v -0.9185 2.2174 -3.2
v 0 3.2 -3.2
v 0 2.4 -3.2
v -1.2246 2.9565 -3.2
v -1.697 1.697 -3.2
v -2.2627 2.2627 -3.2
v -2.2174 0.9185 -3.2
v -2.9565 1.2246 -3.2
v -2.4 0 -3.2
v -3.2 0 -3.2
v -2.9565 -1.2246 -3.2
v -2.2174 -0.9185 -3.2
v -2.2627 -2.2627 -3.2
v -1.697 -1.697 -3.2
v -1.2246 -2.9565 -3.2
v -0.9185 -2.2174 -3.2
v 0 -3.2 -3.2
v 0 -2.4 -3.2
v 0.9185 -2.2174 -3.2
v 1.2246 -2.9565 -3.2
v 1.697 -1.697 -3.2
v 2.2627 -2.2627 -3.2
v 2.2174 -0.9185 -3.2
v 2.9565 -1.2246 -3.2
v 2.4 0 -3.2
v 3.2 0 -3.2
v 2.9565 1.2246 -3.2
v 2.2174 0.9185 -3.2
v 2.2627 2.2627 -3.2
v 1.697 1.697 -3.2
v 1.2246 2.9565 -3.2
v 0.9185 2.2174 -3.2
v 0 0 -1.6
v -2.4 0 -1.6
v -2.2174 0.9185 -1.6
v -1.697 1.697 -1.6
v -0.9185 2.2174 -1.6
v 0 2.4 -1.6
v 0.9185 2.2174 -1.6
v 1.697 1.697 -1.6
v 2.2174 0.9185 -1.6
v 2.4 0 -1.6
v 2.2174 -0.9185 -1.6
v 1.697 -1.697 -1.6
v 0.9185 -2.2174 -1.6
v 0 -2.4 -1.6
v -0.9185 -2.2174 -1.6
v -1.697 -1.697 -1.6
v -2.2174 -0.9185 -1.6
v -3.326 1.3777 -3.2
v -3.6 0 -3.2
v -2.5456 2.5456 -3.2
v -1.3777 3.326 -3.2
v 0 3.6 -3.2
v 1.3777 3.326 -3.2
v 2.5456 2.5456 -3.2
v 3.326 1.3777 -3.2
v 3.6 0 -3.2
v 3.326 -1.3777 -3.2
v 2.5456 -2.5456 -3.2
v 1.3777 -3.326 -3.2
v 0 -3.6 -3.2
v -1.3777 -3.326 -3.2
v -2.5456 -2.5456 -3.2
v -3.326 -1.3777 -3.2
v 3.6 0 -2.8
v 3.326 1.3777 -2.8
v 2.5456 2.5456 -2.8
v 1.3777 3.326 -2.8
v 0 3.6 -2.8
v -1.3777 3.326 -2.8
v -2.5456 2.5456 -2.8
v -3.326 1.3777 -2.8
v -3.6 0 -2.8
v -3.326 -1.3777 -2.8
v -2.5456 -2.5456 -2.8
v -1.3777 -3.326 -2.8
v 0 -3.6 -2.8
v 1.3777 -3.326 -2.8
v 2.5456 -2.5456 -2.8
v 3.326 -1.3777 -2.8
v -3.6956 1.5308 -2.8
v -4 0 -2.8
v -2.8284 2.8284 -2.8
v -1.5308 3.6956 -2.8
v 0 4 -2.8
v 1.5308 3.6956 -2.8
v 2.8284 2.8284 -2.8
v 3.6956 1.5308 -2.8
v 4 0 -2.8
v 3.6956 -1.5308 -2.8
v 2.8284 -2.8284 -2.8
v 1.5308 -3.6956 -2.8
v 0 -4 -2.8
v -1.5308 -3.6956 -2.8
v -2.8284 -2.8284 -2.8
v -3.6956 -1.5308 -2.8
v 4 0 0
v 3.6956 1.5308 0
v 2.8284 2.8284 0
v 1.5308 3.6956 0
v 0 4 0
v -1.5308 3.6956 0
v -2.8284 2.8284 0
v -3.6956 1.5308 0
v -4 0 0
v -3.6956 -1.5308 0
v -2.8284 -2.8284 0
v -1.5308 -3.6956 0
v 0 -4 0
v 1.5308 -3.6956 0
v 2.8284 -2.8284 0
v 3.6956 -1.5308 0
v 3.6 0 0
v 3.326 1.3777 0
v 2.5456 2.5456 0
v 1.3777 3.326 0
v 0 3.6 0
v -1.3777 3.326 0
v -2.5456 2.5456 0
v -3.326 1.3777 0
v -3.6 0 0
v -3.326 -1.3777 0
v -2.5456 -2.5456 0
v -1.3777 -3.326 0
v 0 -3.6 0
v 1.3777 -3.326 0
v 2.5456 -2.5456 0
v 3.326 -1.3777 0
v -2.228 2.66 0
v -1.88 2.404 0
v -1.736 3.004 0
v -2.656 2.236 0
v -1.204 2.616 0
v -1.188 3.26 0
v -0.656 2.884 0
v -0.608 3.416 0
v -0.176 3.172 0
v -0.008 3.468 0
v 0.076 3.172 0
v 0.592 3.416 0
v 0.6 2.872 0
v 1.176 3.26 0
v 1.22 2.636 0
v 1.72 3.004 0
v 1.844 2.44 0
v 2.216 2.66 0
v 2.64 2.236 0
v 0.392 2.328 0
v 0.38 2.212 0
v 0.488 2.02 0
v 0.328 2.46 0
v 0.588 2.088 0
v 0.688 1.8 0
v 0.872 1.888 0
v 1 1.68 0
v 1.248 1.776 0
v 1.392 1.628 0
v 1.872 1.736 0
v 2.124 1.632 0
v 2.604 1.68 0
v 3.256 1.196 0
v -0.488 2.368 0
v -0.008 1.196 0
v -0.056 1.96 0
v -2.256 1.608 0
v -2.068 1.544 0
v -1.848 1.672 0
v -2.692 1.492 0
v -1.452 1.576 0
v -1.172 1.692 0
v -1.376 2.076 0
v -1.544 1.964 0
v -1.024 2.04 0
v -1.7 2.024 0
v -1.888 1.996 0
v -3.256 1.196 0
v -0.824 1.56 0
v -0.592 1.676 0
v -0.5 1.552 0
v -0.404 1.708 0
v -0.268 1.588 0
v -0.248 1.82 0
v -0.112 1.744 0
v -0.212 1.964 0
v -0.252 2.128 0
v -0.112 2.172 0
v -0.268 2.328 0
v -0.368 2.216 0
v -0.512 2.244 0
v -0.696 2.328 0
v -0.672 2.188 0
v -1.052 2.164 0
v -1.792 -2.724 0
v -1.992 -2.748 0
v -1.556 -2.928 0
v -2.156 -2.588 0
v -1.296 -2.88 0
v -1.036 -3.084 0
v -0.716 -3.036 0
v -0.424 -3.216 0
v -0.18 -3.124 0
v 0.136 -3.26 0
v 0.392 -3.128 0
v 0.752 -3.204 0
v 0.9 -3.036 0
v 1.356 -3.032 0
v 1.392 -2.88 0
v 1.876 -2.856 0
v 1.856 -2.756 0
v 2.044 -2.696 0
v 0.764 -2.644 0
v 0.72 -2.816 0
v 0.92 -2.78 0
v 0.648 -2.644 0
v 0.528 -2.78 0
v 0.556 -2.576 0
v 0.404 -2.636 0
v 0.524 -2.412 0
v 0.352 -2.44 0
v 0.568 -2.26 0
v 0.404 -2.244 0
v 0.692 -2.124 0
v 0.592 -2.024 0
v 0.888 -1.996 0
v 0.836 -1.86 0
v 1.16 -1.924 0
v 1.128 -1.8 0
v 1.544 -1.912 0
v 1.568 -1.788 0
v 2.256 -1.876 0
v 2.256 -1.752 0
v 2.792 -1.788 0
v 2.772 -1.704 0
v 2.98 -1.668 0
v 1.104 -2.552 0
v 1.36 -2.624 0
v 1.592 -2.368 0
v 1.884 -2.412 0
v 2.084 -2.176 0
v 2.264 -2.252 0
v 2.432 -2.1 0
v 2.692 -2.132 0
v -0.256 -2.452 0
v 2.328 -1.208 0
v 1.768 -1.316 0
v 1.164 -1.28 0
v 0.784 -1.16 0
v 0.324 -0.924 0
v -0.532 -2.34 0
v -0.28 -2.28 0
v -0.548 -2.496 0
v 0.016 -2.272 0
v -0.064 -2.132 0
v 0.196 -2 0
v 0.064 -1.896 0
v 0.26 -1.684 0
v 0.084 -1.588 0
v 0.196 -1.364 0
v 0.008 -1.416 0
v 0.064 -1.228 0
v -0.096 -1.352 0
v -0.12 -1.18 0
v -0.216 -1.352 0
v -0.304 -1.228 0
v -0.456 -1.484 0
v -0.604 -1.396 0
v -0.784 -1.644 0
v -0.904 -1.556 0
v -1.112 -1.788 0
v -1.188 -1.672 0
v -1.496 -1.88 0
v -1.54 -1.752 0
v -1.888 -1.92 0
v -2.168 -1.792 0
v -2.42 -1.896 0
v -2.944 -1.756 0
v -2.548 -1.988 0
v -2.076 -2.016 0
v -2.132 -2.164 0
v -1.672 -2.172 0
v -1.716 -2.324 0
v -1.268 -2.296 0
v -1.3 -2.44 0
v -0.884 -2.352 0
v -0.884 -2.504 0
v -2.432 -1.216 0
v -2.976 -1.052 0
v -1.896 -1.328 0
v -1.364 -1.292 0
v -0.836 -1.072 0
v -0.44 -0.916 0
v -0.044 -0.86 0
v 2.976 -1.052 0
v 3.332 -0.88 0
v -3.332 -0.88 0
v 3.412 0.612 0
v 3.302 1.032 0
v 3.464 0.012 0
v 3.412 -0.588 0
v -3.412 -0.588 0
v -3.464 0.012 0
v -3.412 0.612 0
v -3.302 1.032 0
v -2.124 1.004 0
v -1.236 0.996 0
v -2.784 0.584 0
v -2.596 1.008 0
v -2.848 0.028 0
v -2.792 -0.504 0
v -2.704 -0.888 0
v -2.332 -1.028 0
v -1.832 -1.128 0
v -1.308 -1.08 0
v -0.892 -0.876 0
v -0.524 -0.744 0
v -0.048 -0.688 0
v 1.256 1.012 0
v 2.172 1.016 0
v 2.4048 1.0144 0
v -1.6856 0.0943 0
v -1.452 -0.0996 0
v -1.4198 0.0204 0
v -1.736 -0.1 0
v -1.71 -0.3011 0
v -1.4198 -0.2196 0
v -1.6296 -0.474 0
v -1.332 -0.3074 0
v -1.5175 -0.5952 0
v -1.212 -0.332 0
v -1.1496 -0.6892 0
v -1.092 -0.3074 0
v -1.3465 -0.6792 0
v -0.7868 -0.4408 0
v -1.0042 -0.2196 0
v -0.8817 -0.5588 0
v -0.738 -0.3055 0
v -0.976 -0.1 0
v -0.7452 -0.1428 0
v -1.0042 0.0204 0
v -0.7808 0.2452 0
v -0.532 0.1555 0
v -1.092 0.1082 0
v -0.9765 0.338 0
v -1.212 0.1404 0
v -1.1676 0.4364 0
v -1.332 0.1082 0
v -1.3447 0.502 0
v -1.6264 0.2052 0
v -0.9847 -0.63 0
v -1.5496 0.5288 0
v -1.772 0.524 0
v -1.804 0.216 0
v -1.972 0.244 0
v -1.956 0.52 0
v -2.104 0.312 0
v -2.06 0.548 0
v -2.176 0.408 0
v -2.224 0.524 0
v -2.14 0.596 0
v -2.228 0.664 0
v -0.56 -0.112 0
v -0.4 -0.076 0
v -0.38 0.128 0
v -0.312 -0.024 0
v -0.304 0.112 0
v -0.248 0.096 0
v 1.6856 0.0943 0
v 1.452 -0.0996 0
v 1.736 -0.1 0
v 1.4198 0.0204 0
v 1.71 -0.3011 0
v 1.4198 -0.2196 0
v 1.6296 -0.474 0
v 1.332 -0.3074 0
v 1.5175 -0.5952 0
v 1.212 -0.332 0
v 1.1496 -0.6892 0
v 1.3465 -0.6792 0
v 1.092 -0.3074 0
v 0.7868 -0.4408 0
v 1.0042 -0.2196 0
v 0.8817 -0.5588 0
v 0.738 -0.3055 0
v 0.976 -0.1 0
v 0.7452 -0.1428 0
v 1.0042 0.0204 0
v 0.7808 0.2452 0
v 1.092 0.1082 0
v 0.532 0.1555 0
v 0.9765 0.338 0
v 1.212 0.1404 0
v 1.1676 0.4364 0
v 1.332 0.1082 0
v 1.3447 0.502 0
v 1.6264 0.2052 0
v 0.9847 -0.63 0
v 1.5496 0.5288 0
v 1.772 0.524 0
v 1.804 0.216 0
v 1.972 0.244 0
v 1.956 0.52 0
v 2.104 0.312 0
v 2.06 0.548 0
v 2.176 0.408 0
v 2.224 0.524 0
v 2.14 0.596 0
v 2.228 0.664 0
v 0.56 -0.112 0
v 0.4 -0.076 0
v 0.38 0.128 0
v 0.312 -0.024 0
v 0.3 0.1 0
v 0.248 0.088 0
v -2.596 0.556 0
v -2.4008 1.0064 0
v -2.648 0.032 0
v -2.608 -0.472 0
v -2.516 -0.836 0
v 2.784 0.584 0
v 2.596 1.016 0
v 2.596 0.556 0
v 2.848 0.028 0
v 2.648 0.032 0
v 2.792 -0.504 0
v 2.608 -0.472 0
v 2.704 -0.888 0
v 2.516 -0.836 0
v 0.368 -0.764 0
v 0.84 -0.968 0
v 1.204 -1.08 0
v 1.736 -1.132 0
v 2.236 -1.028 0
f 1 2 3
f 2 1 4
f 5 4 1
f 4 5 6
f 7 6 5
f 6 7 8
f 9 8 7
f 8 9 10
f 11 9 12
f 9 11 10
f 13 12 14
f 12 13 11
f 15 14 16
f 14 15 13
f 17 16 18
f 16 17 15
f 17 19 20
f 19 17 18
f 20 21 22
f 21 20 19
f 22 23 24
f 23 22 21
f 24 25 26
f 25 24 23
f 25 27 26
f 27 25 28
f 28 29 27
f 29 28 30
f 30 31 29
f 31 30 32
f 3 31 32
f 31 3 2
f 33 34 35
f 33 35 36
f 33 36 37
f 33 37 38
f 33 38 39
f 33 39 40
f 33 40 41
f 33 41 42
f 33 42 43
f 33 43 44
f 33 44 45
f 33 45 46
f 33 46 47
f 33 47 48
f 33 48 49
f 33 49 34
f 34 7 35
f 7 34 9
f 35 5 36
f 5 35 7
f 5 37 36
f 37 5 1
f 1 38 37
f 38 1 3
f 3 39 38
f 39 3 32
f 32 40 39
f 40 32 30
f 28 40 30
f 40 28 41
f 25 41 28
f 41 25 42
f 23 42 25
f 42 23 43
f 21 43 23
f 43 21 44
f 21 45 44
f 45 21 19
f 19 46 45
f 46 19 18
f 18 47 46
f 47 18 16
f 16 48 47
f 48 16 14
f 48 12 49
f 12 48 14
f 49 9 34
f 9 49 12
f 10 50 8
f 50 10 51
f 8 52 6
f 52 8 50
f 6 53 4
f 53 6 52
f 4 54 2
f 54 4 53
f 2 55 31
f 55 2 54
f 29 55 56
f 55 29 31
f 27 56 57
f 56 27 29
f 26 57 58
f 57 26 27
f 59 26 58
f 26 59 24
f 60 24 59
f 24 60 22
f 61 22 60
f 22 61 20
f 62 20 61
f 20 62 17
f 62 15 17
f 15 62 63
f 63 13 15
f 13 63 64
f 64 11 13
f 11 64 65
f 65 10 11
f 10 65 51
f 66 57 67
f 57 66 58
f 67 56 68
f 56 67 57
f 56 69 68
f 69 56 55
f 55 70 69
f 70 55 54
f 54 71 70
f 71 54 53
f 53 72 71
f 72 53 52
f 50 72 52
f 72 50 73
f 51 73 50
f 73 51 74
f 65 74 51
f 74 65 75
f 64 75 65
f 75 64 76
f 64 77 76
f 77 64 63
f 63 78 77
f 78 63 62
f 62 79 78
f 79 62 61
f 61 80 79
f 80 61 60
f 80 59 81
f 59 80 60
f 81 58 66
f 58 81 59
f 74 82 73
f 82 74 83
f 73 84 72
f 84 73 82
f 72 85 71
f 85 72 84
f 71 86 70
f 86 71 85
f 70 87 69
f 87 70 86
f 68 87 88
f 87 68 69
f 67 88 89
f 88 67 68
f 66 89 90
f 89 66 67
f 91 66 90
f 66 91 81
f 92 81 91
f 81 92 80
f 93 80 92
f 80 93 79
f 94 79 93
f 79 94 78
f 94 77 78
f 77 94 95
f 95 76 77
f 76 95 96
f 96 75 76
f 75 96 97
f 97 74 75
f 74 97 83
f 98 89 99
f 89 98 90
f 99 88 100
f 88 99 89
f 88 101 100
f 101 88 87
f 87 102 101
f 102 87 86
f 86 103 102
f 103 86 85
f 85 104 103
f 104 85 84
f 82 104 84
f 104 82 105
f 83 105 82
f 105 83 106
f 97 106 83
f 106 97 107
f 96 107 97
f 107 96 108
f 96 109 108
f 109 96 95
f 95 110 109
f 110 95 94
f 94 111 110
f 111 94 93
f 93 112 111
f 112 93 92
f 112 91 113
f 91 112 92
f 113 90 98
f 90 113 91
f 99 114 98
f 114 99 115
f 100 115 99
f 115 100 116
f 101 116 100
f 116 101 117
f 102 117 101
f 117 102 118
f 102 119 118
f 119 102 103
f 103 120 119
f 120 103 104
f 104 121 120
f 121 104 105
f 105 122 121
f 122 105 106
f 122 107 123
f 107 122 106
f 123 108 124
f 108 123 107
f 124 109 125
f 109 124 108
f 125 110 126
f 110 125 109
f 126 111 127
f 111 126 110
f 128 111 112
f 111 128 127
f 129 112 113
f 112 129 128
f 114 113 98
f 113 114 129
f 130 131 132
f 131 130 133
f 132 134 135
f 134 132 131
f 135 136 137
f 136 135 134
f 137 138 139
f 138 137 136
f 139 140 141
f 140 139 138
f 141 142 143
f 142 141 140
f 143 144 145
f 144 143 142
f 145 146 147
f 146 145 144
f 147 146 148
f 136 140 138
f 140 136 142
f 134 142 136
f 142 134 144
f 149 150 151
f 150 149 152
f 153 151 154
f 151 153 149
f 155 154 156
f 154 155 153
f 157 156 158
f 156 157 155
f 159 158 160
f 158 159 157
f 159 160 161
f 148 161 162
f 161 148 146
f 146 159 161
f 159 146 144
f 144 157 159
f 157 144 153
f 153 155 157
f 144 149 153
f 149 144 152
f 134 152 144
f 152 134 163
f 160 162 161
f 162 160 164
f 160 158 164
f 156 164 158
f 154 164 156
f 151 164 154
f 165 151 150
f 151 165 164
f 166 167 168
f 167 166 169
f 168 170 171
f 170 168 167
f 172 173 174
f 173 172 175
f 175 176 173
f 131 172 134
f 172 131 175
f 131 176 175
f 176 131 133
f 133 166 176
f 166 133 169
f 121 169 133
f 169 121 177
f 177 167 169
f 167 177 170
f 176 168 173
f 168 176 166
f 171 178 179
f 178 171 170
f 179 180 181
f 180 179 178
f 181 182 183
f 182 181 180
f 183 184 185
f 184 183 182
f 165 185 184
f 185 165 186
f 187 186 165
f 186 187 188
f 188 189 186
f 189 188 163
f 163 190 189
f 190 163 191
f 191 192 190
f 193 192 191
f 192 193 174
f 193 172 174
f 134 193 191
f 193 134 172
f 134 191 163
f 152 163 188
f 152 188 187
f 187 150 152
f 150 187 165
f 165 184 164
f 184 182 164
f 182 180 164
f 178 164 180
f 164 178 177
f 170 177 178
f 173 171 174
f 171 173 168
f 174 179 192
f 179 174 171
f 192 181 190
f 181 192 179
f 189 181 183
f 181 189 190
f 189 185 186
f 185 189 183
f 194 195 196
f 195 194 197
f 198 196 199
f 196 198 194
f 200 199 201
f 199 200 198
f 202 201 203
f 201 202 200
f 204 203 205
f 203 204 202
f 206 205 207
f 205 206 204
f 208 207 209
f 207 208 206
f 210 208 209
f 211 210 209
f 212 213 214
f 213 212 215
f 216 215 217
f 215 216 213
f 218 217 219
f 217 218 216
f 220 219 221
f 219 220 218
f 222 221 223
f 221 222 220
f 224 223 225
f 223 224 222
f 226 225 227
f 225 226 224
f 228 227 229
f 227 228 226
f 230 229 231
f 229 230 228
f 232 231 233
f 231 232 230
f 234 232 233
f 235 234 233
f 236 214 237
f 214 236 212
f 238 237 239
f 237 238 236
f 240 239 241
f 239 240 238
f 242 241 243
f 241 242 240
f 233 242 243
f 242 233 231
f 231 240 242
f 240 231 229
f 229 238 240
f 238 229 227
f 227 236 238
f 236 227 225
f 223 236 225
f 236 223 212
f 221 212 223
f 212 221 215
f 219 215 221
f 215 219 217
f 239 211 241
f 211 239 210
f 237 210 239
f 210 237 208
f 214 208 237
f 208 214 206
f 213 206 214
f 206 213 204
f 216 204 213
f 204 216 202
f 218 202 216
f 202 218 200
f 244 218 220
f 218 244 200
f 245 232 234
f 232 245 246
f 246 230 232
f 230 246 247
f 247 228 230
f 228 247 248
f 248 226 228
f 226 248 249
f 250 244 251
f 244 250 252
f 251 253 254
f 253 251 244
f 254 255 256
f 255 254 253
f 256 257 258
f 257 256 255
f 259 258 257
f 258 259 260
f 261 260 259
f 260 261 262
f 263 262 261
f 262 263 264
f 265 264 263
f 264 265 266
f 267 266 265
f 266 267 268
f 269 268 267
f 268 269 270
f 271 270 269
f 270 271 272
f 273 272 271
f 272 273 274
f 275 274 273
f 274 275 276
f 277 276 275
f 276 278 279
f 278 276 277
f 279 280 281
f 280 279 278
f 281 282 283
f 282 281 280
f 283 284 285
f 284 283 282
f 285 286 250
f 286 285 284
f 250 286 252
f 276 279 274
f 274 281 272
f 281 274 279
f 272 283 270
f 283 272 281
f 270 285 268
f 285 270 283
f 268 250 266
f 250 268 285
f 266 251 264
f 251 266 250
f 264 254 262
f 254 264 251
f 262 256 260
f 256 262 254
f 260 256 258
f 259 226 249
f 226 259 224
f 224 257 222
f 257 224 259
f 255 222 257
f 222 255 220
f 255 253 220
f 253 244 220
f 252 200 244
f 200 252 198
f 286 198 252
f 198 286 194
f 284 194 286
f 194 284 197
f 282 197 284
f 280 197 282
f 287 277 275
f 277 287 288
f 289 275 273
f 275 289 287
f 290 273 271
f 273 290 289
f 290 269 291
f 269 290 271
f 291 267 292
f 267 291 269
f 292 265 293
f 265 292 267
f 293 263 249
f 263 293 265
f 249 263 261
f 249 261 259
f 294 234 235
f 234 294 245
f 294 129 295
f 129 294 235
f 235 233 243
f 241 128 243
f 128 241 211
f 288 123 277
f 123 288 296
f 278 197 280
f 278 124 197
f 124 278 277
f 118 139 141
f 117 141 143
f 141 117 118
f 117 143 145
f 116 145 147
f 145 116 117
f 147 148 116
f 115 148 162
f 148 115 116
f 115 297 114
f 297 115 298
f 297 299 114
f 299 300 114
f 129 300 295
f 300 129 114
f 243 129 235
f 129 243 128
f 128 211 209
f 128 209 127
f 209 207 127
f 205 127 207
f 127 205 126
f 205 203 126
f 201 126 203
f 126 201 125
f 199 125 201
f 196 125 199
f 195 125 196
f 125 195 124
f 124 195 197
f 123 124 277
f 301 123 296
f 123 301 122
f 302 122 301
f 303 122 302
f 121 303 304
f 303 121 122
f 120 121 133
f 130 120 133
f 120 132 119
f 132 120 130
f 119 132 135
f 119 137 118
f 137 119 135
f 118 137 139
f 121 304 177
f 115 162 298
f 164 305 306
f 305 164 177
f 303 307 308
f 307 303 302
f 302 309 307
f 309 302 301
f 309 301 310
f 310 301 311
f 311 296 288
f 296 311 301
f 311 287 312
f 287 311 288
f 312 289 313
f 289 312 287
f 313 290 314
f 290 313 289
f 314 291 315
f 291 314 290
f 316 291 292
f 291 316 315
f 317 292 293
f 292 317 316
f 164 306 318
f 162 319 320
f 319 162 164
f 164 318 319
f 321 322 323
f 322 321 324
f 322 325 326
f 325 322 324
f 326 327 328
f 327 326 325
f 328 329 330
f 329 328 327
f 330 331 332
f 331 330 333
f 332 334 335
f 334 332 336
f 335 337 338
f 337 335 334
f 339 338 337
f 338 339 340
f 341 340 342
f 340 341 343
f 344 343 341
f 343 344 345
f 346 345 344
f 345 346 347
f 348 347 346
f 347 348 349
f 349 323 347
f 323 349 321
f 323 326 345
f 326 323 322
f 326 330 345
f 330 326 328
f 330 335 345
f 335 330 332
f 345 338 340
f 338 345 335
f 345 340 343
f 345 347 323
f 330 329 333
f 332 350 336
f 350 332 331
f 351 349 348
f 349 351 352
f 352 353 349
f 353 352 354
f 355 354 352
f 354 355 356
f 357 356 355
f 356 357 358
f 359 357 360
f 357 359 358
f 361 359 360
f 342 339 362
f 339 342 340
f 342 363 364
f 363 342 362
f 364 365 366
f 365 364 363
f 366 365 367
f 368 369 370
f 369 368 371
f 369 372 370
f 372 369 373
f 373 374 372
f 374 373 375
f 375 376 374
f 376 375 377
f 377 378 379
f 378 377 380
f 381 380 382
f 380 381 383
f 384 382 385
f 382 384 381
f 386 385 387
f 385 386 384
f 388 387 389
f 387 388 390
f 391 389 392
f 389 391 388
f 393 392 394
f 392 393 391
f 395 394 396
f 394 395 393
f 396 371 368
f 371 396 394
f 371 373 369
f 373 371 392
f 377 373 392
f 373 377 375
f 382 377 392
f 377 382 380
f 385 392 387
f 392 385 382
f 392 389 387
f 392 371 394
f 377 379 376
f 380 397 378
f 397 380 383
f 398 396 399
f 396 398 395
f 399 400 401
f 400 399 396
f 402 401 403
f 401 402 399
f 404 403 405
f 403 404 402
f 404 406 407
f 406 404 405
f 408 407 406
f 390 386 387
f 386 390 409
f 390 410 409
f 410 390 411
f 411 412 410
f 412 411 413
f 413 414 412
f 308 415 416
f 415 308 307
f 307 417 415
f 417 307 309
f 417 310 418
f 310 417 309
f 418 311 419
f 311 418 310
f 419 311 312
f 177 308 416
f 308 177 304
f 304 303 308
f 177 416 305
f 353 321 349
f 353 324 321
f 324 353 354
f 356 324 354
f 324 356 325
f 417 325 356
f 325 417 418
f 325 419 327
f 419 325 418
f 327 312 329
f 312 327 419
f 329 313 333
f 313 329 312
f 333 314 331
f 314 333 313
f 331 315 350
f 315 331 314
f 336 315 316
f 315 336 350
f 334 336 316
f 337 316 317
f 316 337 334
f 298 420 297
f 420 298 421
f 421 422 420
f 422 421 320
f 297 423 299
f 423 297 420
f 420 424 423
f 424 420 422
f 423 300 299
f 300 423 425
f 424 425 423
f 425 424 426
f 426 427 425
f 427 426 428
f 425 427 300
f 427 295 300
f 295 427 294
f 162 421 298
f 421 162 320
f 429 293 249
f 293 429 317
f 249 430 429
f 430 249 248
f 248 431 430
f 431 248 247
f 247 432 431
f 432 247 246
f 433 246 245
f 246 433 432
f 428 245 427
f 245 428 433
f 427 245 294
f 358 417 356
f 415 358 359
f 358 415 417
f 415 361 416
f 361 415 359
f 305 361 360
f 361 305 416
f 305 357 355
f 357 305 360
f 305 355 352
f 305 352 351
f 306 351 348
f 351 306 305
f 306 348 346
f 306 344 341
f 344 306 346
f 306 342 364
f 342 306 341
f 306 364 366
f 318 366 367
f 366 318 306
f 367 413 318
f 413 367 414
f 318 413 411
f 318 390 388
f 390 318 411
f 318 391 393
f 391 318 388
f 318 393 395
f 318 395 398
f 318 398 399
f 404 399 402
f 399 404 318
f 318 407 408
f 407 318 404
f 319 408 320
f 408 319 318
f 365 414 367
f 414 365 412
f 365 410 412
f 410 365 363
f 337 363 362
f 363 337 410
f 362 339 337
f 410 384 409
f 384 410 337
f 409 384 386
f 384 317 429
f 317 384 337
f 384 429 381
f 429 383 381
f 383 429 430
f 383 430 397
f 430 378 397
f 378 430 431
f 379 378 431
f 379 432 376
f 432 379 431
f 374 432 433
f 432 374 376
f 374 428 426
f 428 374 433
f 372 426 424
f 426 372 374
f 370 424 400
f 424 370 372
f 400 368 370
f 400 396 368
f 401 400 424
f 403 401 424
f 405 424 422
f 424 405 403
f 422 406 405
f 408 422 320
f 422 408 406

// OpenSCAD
use <../lib.scad>
use <../p/4-4ering.scad>
use <s/98138pn0s01.scad>
use <s/98138s01.scad>
function ldraw_lib__98138pn8() = [
// 0 Tile  1 x  1 Round with Ninjago Trapped Nya Patternn
// 0 Name: 98138pn8.dat
// 0 Author: Gerald Lasser [GeraldLasser]
// 0 !LDRAW_ORG Part UPDATE 2017-01
// 0 !LICENSE Licensed under CC BY 4.0 : see CAreadme.txt
// 
// 0 BFC CERTIFY CCW
  [0,"BFC","CERTIFY"],
  [0,"BFC","CCW"],
// 
// 0 !KEYWORDS BrickLink 98138pb053
// 
// 0 !HISTORY 2017-12-30 [PTadmin] Official Update 2017-01
// 
// 
// 1 16 0 0 0 1 0 0 0 1 0 0 0 1 s\98138s01.dat
  [1,16,0,0,0,1,0,0,0,1,0,0,0,1, ldraw_lib__s__98138s01()],
// 1 16 0 0 0 9 0 0 0 1 0 0 0 9 4-4ering.dat
  [1,16,0,0,0,9,0,0,0,1,0,0,0,9, ldraw_lib__4_4ering()],
// 1 16 0 0 0 1 0 0 0 1 0 0 0 1 s\98138pn0s01.dat
  [1,16,0,0,0,1,0,0,0,1,0,0,0,1, ldraw_lib__s__98138pn0s01()],
// 4 0 -5.31 0 2.51 -3.09 0 2.49 -0.02 0 2.99 -8.14 0 2.99
  [4,0,-5.31,0,2.51,-3.09,0,2.49,-0.02,0,2.99,-8.14,0,2.99],
// 4 320 -6.96 0 1.46 -6.49 0 2.52 -8.53 0 1.53 -8.66 0 0.03
  [4,320,-6.96,0,1.46,-6.49,0,2.52,-8.53,0,1.53,-8.66,0,0.03],
// 4 320 -7.12 0 0.07 -6.96 0 1.46 -8.66 0 0.03 -8.53 0 -1.47
  [4,320,-7.12,0,0.07,-6.96,0,1.46,-8.66,0,0.03,-8.53,0,-1.47],
// 3 320 -7.12 0 0.07 -8.53 0 -1.47 -6.98 0 -1.26
  [3,320,-7.12,0,0.07,-8.53,0,-1.47,-6.98,0,-1.26],
// 3 320 -6.98 0 -1.26 -8.53 0 -1.47 -6.76 0 -2.22
  [3,320,-6.98,0,-1.26,-8.53,0,-1.47,-6.76,0,-2.22],
// 4 0 -8.53 0 -1.47 -8.33 0 -2.2 -7.44 0 -2.63 -6.76 0 -2.22
  [4,0,-8.53,0,-1.47,-8.33,0,-2.2,-7.44,0,-2.63,-6.76,0,-2.22],
// 4 0 -6.08 0 -3.04 -5.83 0 -2.57 -6.76 0 -2.22 -7.44 0 -2.63
  [4,0,-6.08,0,-3.04,-5.83,0,-2.57,-6.76,0,-2.22,-7.44,0,-2.63],
// 4 0 -4.74 0 -3.32 -4.58 0 -2.82 -5.83 0 -2.57 -6.08 0 -3.04
  [4,0,-4.74,0,-3.32,-4.58,0,-2.82,-5.83,0,-2.57,-6.08,0,-3.04],
// 4 0 -3.41 0 -3.23 -3.27 0 -2.7 -4.58 0 -2.82 -4.74 0 -3.32
  [4,0,-3.41,0,-3.23,-3.27,0,-2.7,-4.58,0,-2.82,-4.74,0,-3.32],
// 4 0 -2.09 0 -2.68 -2.23 0 -2.19 -3.27 0 -2.7 -3.41 0 -3.23
  [4,0,-2.09,0,-2.68,-2.23,0,-2.19,-3.27,0,-2.7,-3.41,0,-3.23],
// 4 0 -1.1 0 -2.29 -1.31 0 -1.86 -2.23 0 -2.19 -2.09 0 -2.68
  [4,0,-1.1,0,-2.29,-1.31,0,-1.86,-2.23,0,-2.19,-2.09,0,-2.68],
// 4 0 -0.11 0 -2.15 -0.12 0 -1.72 -1.31 0 -1.86 -1.1 0 -2.29
  [4,0,-0.11,0,-2.15,-0.12,0,-1.72,-1.31,0,-1.86,-1.1,0,-2.29],
// 3 0 -0.02 0 2.99 -3.09 0 2.49 3.14 0 2.53
  [3,0,-0.02,0,2.99,-3.09,0,2.49,3.14,0,2.53],
// 4 0 5.43 0 2.54 6.0121 0 2.5359 8.14 0 2.99 -0.02 0 2.99
  [4,0,5.43,0,2.54,6.0121,0,2.5359,8.14,0,2.99,-0.02,0,2.99],
// 3 0 -0.02 0 2.99 3.14 0 2.53 5.43 0 2.54
  [3,0,-0.02,0,2.99,3.14,0,2.53,5.43,0,2.54],
// 4 0 -3.63 0 -0.249 -3.5496 0 0.051 -4.2139 0 0.2357 -4.34 0 -0.25
  [4,0,-3.63,0,-0.249,-3.5496,0,0.051,-4.2139,0,0.2357,-4.34,0,-0.25],
// 4 0 -3.5496 0 -0.549 -3.63 0 -0.249 -4.34 0 -0.25 -4.2749 0 -0.7527
  [4,0,-3.5496,0,-0.549,-3.63,0,-0.249,-4.34,0,-0.25,-4.2749,0,-0.7527],
// 4 0 -3.33 0 -0.7686 -3.5496 0 -0.549 -4.2749 0 -0.7527 -4.0741 0 -1.1851
  [4,0,-3.33,0,-0.7686,-3.5496,0,-0.549,-4.2749,0,-0.7527,-4.0741,0,-1.1851],
// 4 0 -3.33 0 -0.7686 -4.0741 0 -1.1851 -3.7937 0 -1.4879 -3.03 0 -0.83
  [4,0,-3.33,0,-0.7686,-4.0741,0,-1.1851,-3.7937,0,-1.4879,-3.03,0,-0.83],
// 4 0 -2.874 0 -1.723 -2.73 0 -0.7686 -3.03 0 -0.83 -3.3663 0 -1.6979
  [4,0,-2.874,0,-1.723,-2.73,0,-0.7686,-3.03,0,-0.83,-3.3663,0,-1.6979],
// 4 0 -2.5104 0 -0.549 -2.73 0 -0.7686 -2.2043 0 -1.3969 -1.9669 0 -1.1021
  [4,0,-2.5104,0,-0.549,-2.73,0,-0.7686,-2.2043,0,-1.3969,-1.9669,0,-1.1021],
// 4 0 -2.5104 0 -0.549 -1.9669 0 -1.1021 -1.8451 0 -0.7637 -2.44 0 -0.25
  [4,0,-2.5104,0,-0.549,-1.9669,0,-1.1021,-1.8451,0,-0.7637,-2.44,0,-0.25],
// 4 0 -2.44 0 -0.25 -1.8451 0 -0.7637 -1.863 0 -0.357 -2.5104 0 0.051
  [4,0,-2.44,0,-0.25,-1.8451,0,-0.7637,-1.863,0,-0.357,-2.5104,0,0.051],
// 4 0 -2.5104 0 0.051 -1.3301 0 0.3887 -1.9519 0 0.6131 -2.73 0 0.2706
  [4,0,-2.5104,0,0.051,-1.3301,0,0.3887,-1.9519,0,0.6131,-2.73,0,0.2706],
// 4 0 -2.73 0 0.2706 -1.9519 0 0.6131 -2.4413 0 0.8449 -3.03 0 0.351
  [4,0,-2.73,0,0.2706,-1.9519,0,0.6131,-2.4413,0,0.8449,-3.03,0,0.351],
// 4 0 -3.03 0 0.351 -2.4413 0 0.8449 -2.919 0 1.091 -3.33 0 0.2706
  [4,0,-3.03,0,0.351,-2.4413,0,0.8449,-2.919,0,1.091,-3.33,0,0.2706],
// 4 0 -3.33 0 0.2706 -2.919 0 1.091 -3.3617 0 1.2549 -4.0661 0 0.5131
  [4,0,-3.33,0,0.2706,-2.919,0,1.091,-3.3617,0,1.2549,-4.0661,0,0.5131],
// 4 0 -3.5496 0 0.051 -3.33 0 0.2706 -4.0661 0 0.5131 -4.2139 0 0.2357
  [4,0,-3.5496,0,0.051,-3.33,0,0.2706,-4.0661,0,0.5131,-4.2139,0,0.2357],
// 4 14 -3.03 0 0.351 -3.5496 0 0.051 -3.63 0 -0.249 -3.5496 0 -0.549
  [4,14,-3.03,0,0.351,-3.5496,0,0.051,-3.63,0,-0.249,-3.5496,0,-0.549],
// 4 14 -3.03 0 0.351 -3.5496 0 -0.549 -3.33 0 -0.7686 -3.03 0 -0.83
  [4,14,-3.03,0,0.351,-3.5496,0,-0.549,-3.33,0,-0.7686,-3.03,0,-0.83],
// 4 14 -3.03 0 0.351 -3.03 0 -0.83 -2.73 0 -0.7686 -2.5104 0 -0.549
  [4,14,-3.03,0,0.351,-3.03,0,-0.83,-2.73,0,-0.7686,-2.5104,0,-0.549],
// 4 14 -3.03 0 0.351 -2.5104 0 -0.549 -2.44 0 -0.25 -2.5104 0 0.051
  [4,14,-3.03,0,0.351,-2.5104,0,-0.549,-2.44,0,-0.25,-2.5104,0,0.051],
// 3 14 -3.03 0 0.351 -2.5104 0 0.051 -2.73 0 0.2706
  [3,14,-3.03,0,0.351,-2.5104,0,0.051,-2.73,0,0.2706],
// 3 14 -3.03 0 0.351 -3.33 0 0.2706 -3.5496 0 0.051
  [3,14,-3.03,0,0.351,-3.33,0,0.2706,-3.5496,0,0.051],
// 3 0 -3.03 0 -0.83 -3.7937 0 -1.4879 -3.3663 0 -1.6979
  [3,0,-3.03,0,-0.83,-3.7937,0,-1.4879,-3.3663,0,-1.6979],
// 4 0 -2.73 0 -0.7686 -2.874 0 -1.723 -2.4617 0 -1.5749 -2.2043 0 -1.3969
  [4,0,-2.73,0,-0.7686,-2.874,0,-1.723,-2.4617,0,-1.5749,-2.2043,0,-1.3969],
// 4 0 -4.0661 0 0.5131 -3.3617 0 1.2549 -3.874 0 1.322 -4.43 0 1.31
  [4,0,-4.0661,0,0.5131,-3.3617,0,1.2549,-3.874,0,1.322,-4.43,0,1.31],
// 4 0 -4.51 0 0.54 -4.0661 0 0.5131 -4.43 0 1.31 -4.93 0 0.61
  [4,0,-4.51,0,0.54,-4.0661,0,0.5131,-4.43,0,1.31,-4.93,0,0.61],
// 4 0 -4.93 0 0.61 -4.43 0 1.31 -4.89 0 1.3 -5.26 0 0.78
  [4,0,-4.93,0,0.61,-4.43,0,1.31,-4.89,0,1.3,-5.26,0,0.78],
// 4 0 -5.44 0 1.02 -5.26 0 0.78 -4.89 0 1.3 -5.15 0 1.37
  [4,0,-5.44,0,1.02,-5.26,0,0.78,-4.89,0,1.3,-5.15,0,1.37],
// 4 0 -5.56 0 1.31 -5.44 0 1.02 -5.15 0 1.37 -5.35 0 1.49
  [4,0,-5.56,0,1.31,-5.44,0,1.02,-5.15,0,1.37,-5.35,0,1.49],
// 3 0 -5.57 0 1.66 -5.56 0 1.31 -5.35 0 1.49
  [3,0,-5.57,0,1.66,-5.56,0,1.31,-5.35,0,1.49],
// 4 0 -1.3301 0 0.3887 -2.5104 0 0.051 -1.863 0 -0.357 -1.4 0 -0.28
  [4,0,-1.3301,0,0.3887,-2.5104,0,0.051,-1.863,0,-0.357,-1.4,0,-0.28],
// 4 0 -1.3301 0 0.3887 -1.4 0 -0.28 -1 0 -0.19 -0.95 0 0.32
  [4,0,-1.3301,0,0.3887,-1.4,0,-0.28,-1,0,-0.19,-0.95,0,0.32],
// 4 0 -0.76 0 0.28 -0.95 0 0.32 -1 0 -0.19 -0.78 0 -0.06
  [4,0,-0.76,0,0.28,-0.95,0,0.32,-1,0,-0.19,-0.78,0,-0.06],
// 3 0 -0.76 0 0.28 -0.78 0 -0.06 -0.62 0 0.24
  [3,0,-0.76,0,0.28,-0.78,0,-0.06,-0.62,0,0.24],
// 4 0 4.2139 0 0.2357 3.5496 0 0.051 3.63 0 -0.249 4.34 0 -0.25
  [4,0,4.2139,0,0.2357,3.5496,0,0.051,3.63,0,-0.249,4.34,0,-0.25],
// 4 0 4.34 0 -0.25 3.63 0 -0.249 3.5496 0 -0.549 4.2749 0 -0.7527
  [4,0,4.34,0,-0.25,3.63,0,-0.249,3.5496,0,-0.549,4.2749,0,-0.7527],
// 4 0 4.2749 0 -0.7527 3.5496 0 -0.549 3.33 0 -0.7686 4.0741 0 -1.1851
  [4,0,4.2749,0,-0.7527,3.5496,0,-0.549,3.33,0,-0.7686,4.0741,0,-1.1851],
// 4 0 3.7937 0 -1.4879 4.0741 0 -1.1851 3.33 0 -0.7686 3.03 0 -0.83
  [4,0,3.7937,0,-1.4879,4.0741,0,-1.1851,3.33,0,-0.7686,3.03,0,-0.83],
// 4 0 3.03 0 -0.83 2.73 0 -0.7686 2.874 0 -1.723 3.3663 0 -1.6979
  [4,0,3.03,0,-0.83,2.73,0,-0.7686,2.874,0,-1.723,3.3663,0,-1.6979],
// 4 0 2.2043 0 -1.3969 2.73 0 -0.7686 2.5104 0 -0.549 1.9669 0 -1.1021
  [4,0,2.2043,0,-1.3969,2.73,0,-0.7686,2.5104,0,-0.549,1.9669,0,-1.1021],
// 4 0 1.8451 0 -0.7637 1.9669 0 -1.1021 2.5104 0 -0.549 2.44 0 -0.25
  [4,0,1.8451,0,-0.7637,1.9669,0,-1.1021,2.5104,0,-0.549,2.44,0,-0.25],
// 4 0 1.863 0 -0.357 1.8451 0 -0.7637 2.44 0 -0.25 2.5104 0 0.051
  [4,0,1.863,0,-0.357,1.8451,0,-0.7637,2.44,0,-0.25,2.5104,0,0.051],
// 4 0 1.9519 0 0.6131 1.3301 0 0.3887 2.5104 0 0.051 2.73 0 0.2706
  [4,0,1.9519,0,0.6131,1.3301,0,0.3887,2.5104,0,0.051,2.73,0,0.2706],
// 4 0 2.4413 0 0.8449 1.9519 0 0.6131 2.73 0 0.2706 3.03 0 0.351
  [4,0,2.4413,0,0.8449,1.9519,0,0.6131,2.73,0,0.2706,3.03,0,0.351],
// 4 0 2.919 0 1.091 2.4413 0 0.8449 3.03 0 0.351 3.33 0 0.2706
  [4,0,2.919,0,1.091,2.4413,0,0.8449,3.03,0,0.351,3.33,0,0.2706],
// 4 0 3.3617 0 1.2549 2.919 0 1.091 3.33 0 0.2706 4.0661 0 0.5131
  [4,0,3.3617,0,1.2549,2.919,0,1.091,3.33,0,0.2706,4.0661,0,0.5131],
// 4 0 4.0661 0 0.5131 3.33 0 0.2706 3.5496 0 0.051 4.2139 0 0.2357
  [4,0,4.0661,0,0.5131,3.33,0,0.2706,3.5496,0,0.051,4.2139,0,0.2357],
// 4 14 3.63 0 -0.249 3.5496 0 0.051 3.03 0 0.351 3.5496 0 -0.549
  [4,14,3.63,0,-0.249,3.5496,0,0.051,3.03,0,0.351,3.5496,0,-0.549],
// 4 14 3.33 0 -0.7686 3.5496 0 -0.549 3.03 0 0.351 3.03 0 -0.83
  [4,14,3.33,0,-0.7686,3.5496,0,-0.549,3.03,0,0.351,3.03,0,-0.83],
// 4 14 2.73 0 -0.7686 3.03 0 -0.83 3.03 0 0.351 2.5104 0 -0.549
  [4,14,2.73,0,-0.7686,3.03,0,-0.83,3.03,0,0.351,2.5104,0,-0.549],
// 4 14 2.44 0 -0.25 2.5104 0 -0.549 3.03 0 0.351 2.5104 0 0.051
  [4,14,2.44,0,-0.25,2.5104,0,-0.549,3.03,0,0.351,2.5104,0,0.051],
// 3 14 3.03 0 0.351 2.73 0 0.2706 2.5104 0 0.051
  [3,14,3.03,0,0.351,2.73,0,0.2706,2.5104,0,0.051],
// 3 14 3.03 0 0.351 3.5496 0 0.051 3.33 0 0.2706
  [3,14,3.03,0,0.351,3.5496,0,0.051,3.33,0,0.2706],
// 3 0 3.03 0 -0.83 3.3663 0 -1.6979 3.7937 0 -1.4879
  [3,0,3.03,0,-0.83,3.3663,0,-1.6979,3.7937,0,-1.4879],
// 4 0 2.4617 0 -1.5749 2.874 0 -1.723 2.73 0 -0.7686 2.2043 0 -1.3969
  [4,0,2.4617,0,-1.5749,2.874,0,-1.723,2.73,0,-0.7686,2.2043,0,-1.3969],
// 4 0 3.874 0 1.322 3.3617 0 1.2549 4.0661 0 0.5131 4.43 0 1.31
  [4,0,3.874,0,1.322,3.3617,0,1.2549,4.0661,0,0.5131,4.43,0,1.31],
// 4 0 4.43 0 1.31 4.0661 0 0.5131 4.51 0 0.54 4.93 0 0.61
  [4,0,4.43,0,1.31,4.0661,0,0.5131,4.51,0,0.54,4.93,0,0.61],
// 4 0 4.89 0 1.3 4.43 0 1.31 4.93 0 0.61 5.26 0 0.78
  [4,0,4.89,0,1.3,4.43,0,1.31,4.93,0,0.61,5.26,0,0.78],
// 4 0 4.89 0 1.3 5.26 0 0.78 5.44 0 1.02 5.15 0 1.37
  [4,0,4.89,0,1.3,5.26,0,0.78,5.44,0,1.02,5.15,0,1.37],
// 4 0 5.15 0 1.37 5.44 0 1.02 5.56 0 1.31 5.35 0 1.49
  [4,0,5.15,0,1.37,5.44,0,1.02,5.56,0,1.31,5.35,0,1.49],
// 3 0 5.57 0 1.66 5.35 0 1.49 5.56 0 1.31
  [3,0,5.57,0,1.66,5.35,0,1.49,5.56,0,1.31],
// 4 0 1.863 0 -0.357 2.5104 0 0.051 1.3301 0 0.3887 1.4 0 -0.28
  [4,0,1.863,0,-0.357,2.5104,0,0.051,1.3301,0,0.3887,1.4,0,-0.28],
// 4 0 1 0 -0.19 1.4 0 -0.28 1.3301 0 0.3887 0.95 0 0.32
  [4,0,1,0,-0.19,1.4,0,-0.28,1.3301,0,0.3887,0.95,0,0.32],
// 4 0 1 0 -0.19 0.95 0 0.32 0.75 0 0.25 0.78 0 -0.06
  [4,0,1,0,-0.19,0.95,0,0.32,0.75,0,0.25,0.78,0,-0.06],
// 3 0 0.75 0 0.25 0.62 0 0.22 0.78 0 -0.06
  [3,0,0.75,0,0.25,0.62,0,0.22,0.78,0,-0.06],
// 4 0 -6.96 0 1.46 -6.49 0 1.39 -6.0021 0 2.5159 -6.49 0 2.52
  [4,0,-6.96,0,1.46,-6.49,0,1.39,-6.0021,0,2.5159,-6.49,0,2.52],
// 4 0 -7.12 0 0.07 -6.62 0 0.08 -6.49 0 1.39 -6.96 0 1.46
  [4,0,-7.12,0,0.07,-6.62,0,0.08,-6.49,0,1.39,-6.96,0,1.46],
// 4 0 -6.62 0 0.08 -7.12 0 0.07 -6.98 0 -1.26 -6.52 0 -1.18
  [4,0,-6.62,0,0.08,-7.12,0,0.07,-6.98,0,-1.26,-6.52,0,-1.18],
// 4 0 -6.29 0 -2.09 -6.52 0 -1.18 -6.98 0 -1.26 -6.76 0 -2.22
  [4,0,-6.29,0,-2.09,-6.52,0,-1.18,-6.98,0,-1.26,-6.76,0,-2.22],
// 3 0 -6.29 0 -2.09 -6.76 0 -2.22 -5.83 0 -2.57
  [3,0,-6.29,0,-2.09,-6.76,0,-2.22,-5.83,0,-2.57],
// 4 0 -8.14 0 2.99 -8.255 0 2.58 -6.49 0 2.52 -6.0021 0 2.5159
  [4,0,-8.14,0,2.99,-8.255,0,2.58,-6.49,0,2.52,-6.0021,0,2.5159],
// 3 320 -8.255 0 2.58 -8.53 0 1.53 -6.49 0 2.52
  [3,320,-8.255,0,2.58,-8.53,0,1.53,-6.49,0,2.52],
// 3 0 -8.14 0 2.99 -6.0021 0 2.5159 -5.31 0 2.51
  [3,0,-8.14,0,2.99,-6.0021,0,2.5159,-5.31,0,2.51],
// 3 14 -4.51 0 0.54 -4.2139 0 0.2357 -4.0661 0 0.5131
  [3,14,-4.51,0,0.54,-4.2139,0,0.2357,-4.0661,0,0.5131],
// 4 14 -4.2139 0 0.2357 -4.51 0 0.54 -4.93 0 0.61 -4.34 0 -0.25
  [4,14,-4.2139,0,0.2357,-4.51,0,0.54,-4.93,0,0.61,-4.34,0,-0.25],
// 4 14 -4.34 0 -0.25 -4.93 0 0.61 -5.26 0 0.78 -4.2749 0 -0.7527
  [4,14,-4.34,0,-0.25,-4.93,0,0.61,-5.26,0,0.78,-4.2749,0,-0.7527],
// 4 14 -4.2749 0 -0.7527 -5.26 0 0.78 -6.62 0 0.08 -6.52 0 -1.18
  [4,14,-4.2749,0,-0.7527,-5.26,0,0.78,-6.62,0,0.08,-6.52,0,-1.18],
// 4 14 -4.0741 0 -1.1851 -4.2749 0 -0.7527 -6.52 0 -1.18 -6.29 0 -2.09
  [4,14,-4.0741,0,-1.1851,-4.2749,0,-0.7527,-6.52,0,-1.18,-6.29,0,-2.09],
// 4 14 -3.7937 0 -1.4879 -4.0741 0 -1.1851 -6.29 0 -2.09 -5.83 0 -2.57
  [4,14,-3.7937,0,-1.4879,-4.0741,0,-1.1851,-6.29,0,-2.09,-5.83,0,-2.57],
// 4 14 -3.7937 0 -1.4879 -5.83 0 -2.57 -4.58 0 -2.82 -3.3663 0 -1.6979
  [4,14,-3.7937,0,-1.4879,-5.83,0,-2.57,-4.58,0,-2.82,-3.3663,0,-1.6979],
// 4 14 -3.3663 0 -1.6979 -4.58 0 -2.82 -3.27 0 -2.7 -2.874 0 -1.723
  [4,14,-3.3663,0,-1.6979,-4.58,0,-2.82,-3.27,0,-2.7,-2.874,0,-1.723],
// 4 14 -2.874 0 -1.723 -3.27 0 -2.7 -2.23 0 -2.19 -2.4617 0 -1.5749
  [4,14,-2.874,0,-1.723,-3.27,0,-2.7,-2.23,0,-2.19,-2.4617,0,-1.5749],
// 4 14 -2.2043 0 -1.3969 -2.4617 0 -1.5749 -2.23 0 -2.19 -1.31 0 -1.86
  [4,14,-2.2043,0,-1.3969,-2.4617,0,-1.5749,-2.23,0,-2.19,-1.31,0,-1.86],
// 3 14 -1.9669 0 -1.1021 -2.2043 0 -1.3969 -1.31 0 -1.86
  [3,14,-1.9669,0,-1.1021,-2.2043,0,-1.3969,-1.31,0,-1.86],
// 4 14 -1.8451 0 -0.7637 -1.9669 0 -1.1021 -1.31 0 -1.86 -0.12 0 -1.72
  [4,14,-1.8451,0,-0.7637,-1.9669,0,-1.1021,-1.31,0,-1.86,-0.12,0,-1.72],
// 4 320 8.53 0 1.53 8.255 0 2.58 6.49 0 2.54 6.96 0 1.46
  [4,320,8.53,0,1.53,8.255,0,2.58,6.49,0,2.54,6.96,0,1.46],
// 4 0 6.96 0 1.46 6.49 0 2.54 6.0121 0 2.5359 6.49 0 1.39
  [4,0,6.96,0,1.46,6.49,0,2.54,6.0121,0,2.5359,6.49,0,1.39],
// 4 320 8.66 0 0.03 8.53 0 1.53 6.96 0 1.46 7.12 0 0.07
  [4,320,8.66,0,0.03,8.53,0,1.53,6.96,0,1.46,7.12,0,0.07],
// 4 0 7.12 0 0.07 6.96 0 1.46 6.49 0 1.39 6.62 0 0.08
  [4,0,7.12,0,0.07,6.96,0,1.46,6.49,0,1.39,6.62,0,0.08],
// 4 320 8.53 0 -1.47 8.66 0 0.03 7.12 0 0.07 6.98 0 -1.26
  [4,320,8.53,0,-1.47,8.66,0,0.03,7.12,0,0.07,6.98,0,-1.26],
// 4 0 6.98 0 -1.26 7.12 0 0.07 6.62 0 0.08 6.52 0 -1.18
  [4,0,6.98,0,-1.26,7.12,0,0.07,6.62,0,0.08,6.52,0,-1.18],
// 4 0 6.98 0 -1.26 6.52 0 -1.18 6.29 0 -2.09 6.76 0 -2.22
  [4,0,6.98,0,-1.26,6.52,0,-1.18,6.29,0,-2.09,6.76,0,-2.22],
// 3 320 6.98 0 -1.26 6.76 0 -2.22 8.53 0 -1.47
  [3,320,6.98,0,-1.26,6.76,0,-2.22,8.53,0,-1.47],
// 4 0 8.53 0 -1.47 6.76 0 -2.22 7.44 0 -2.63 8.33 0 -2.2
  [4,0,8.53,0,-1.47,6.76,0,-2.22,7.44,0,-2.63,8.33,0,-2.2],
// 4 0 6.49 0 2.54 8.255 0 2.58 8.14 0 2.99 6.0121 0 2.5359
  [4,0,6.49,0,2.54,8.255,0,2.58,8.14,0,2.99,6.0121,0,2.5359],
// 4 0 0.92 0 -1.91 -0.12 0 -1.72 -0.11 0 -2.15 0.81 0 -2.31
  [4,0,0.92,0,-1.91,-0.12,0,-1.72,-0.11,0,-2.15,0.81,0,-2.31],
// 4 0 2.1 0 -2.42 0.92 0 -1.91 0.81 0 -2.31 1.96 0 -2.9
  [4,0,2.1,0,-2.42,0.92,0,-1.91,0.81,0,-2.31,1.96,0,-2.9],
// 4 0 3.01 0 -2.7 2.1 0 -2.42 1.96 0 -2.9 2.91 0 -3.2
  [4,0,3.01,0,-2.7,2.1,0,-2.42,1.96,0,-2.9,2.91,0,-3.2],
// 4 0 4.34 0 -2.83 3.01 0 -2.7 2.91 0 -3.2 4.42 0 -3.29
  [4,0,4.34,0,-2.83,3.01,0,-2.7,2.91,0,-3.2,4.42,0,-3.29],
// 4 0 5.59 0 -2.57 4.34 0 -2.83 4.42 0 -3.29 5.82 0 -3.02
  [4,0,5.59,0,-2.57,4.34,0,-2.83,4.42,0,-3.29,5.82,0,-3.02],
// 4 0 6.29 0 -2.09 5.59 0 -2.57 5.82 0 -3.02 6.76 0 -2.22
  [4,0,6.29,0,-2.09,5.59,0,-2.57,5.82,0,-3.02,6.76,0,-2.22],
// 3 0 6.76 0 -2.22 5.82 0 -3.02 7.44 0 -2.63
  [3,0,6.76,0,-2.22,5.82,0,-3.02,7.44,0,-2.63],
// 3 14 -5.44 0 1.02 -6.62 0 0.08 -5.26 0 0.78
  [3,14,-5.44,0,1.02,-6.62,0,0.08,-5.26,0,0.78],
// 4 14 -6.62 0 0.08 -5.44 0 1.02 -5.56 0 1.31 -6.49 0 1.39
  [4,14,-6.62,0,0.08,-5.44,0,1.02,-5.56,0,1.31,-6.49,0,1.39],
// 4 14 -6.49 0 1.39 -5.56 0 1.31 -5.57 0 1.66 -6.0021 0 2.5159
  [4,14,-6.49,0,1.39,-5.56,0,1.31,-5.57,0,1.66,-6.0021,0,2.5159],
// 4 14 -5.31 0 2.51 -6.0021 0 2.5159 -5.57 0 1.66 -5.35 0 1.49
  [4,14,-5.31,0,2.51,-6.0021,0,2.5159,-5.57,0,1.66,-5.35,0,1.49],
// 4 14 -5.31 0 2.51 -5.35 0 1.49 -5.15 0 1.37 -4.89 0 1.3
  [4,14,-5.31,0,2.51,-5.35,0,1.49,-5.15,0,1.37,-4.89,0,1.3],
// 3 14 -5.31 0 2.51 -4.89 0 1.3 -4.43 0 1.31
  [3,14,-5.31,0,2.51,-4.89,0,1.3,-4.43,0,1.31],
// 3 14 -5.31 0 2.51 -4.43 0 1.31 -3.874 0 1.322
  [3,14,-5.31,0,2.51,-4.43,0,1.31,-3.874,0,1.322],
// 4 14 -5.31 0 2.51 -3.874 0 1.322 -3.3617 0 1.2549 -3.09 0 2.49
  [4,14,-5.31,0,2.51,-3.874,0,1.322,-3.3617,0,1.2549,-3.09,0,2.49],
// 3 14 -3.09 0 2.49 -3.3617 0 1.2549 -2.919 0 1.091
  [3,14,-3.09,0,2.49,-3.3617,0,1.2549,-2.919,0,1.091],
// 4 14 -3.09 0 2.49 -2.919 0 1.091 -2.4413 0 0.8449 -1.9519 0 0.6131
  [4,14,-3.09,0,2.49,-2.919,0,1.091,-2.4413,0,0.8449,-1.9519,0,0.6131],
// 4 14 -3.09 0 2.49 -1.9519 0 0.6131 -1.3301 0 0.3887 -0.95 0 0.32
  [4,14,-3.09,0,2.49,-1.9519,0,0.6131,-1.3301,0,0.3887,-0.95,0,0.32],
// 3 14 -3.09 0 2.49 -0.95 0 0.32 -0.76 0 0.28
  [3,14,-3.09,0,2.49,-0.95,0,0.32,-0.76,0,0.28],
// 4 14 -3.09 0 2.49 -0.76 0 0.28 -0.62 0 0.24 3.14 0 2.53
  [4,14,-3.09,0,2.49,-0.76,0,0.28,-0.62,0,0.24,3.14,0,2.53],
// 4 14 3.14 0 2.53 -0.62 0 0.24 0.62 0 0.22 0.75 0 0.25
  [4,14,3.14,0,2.53,-0.62,0,0.24,0.62,0,0.22,0.75,0,0.25],
// 3 14 3.14 0 2.53 0.75 0 0.25 0.95 0 0.32
  [3,14,3.14,0,2.53,0.75,0,0.25,0.95,0,0.32],
// 4 14 3.14 0 2.53 0.95 0 0.32 1.3301 0 0.3887 1.9519 0 0.6131
  [4,14,3.14,0,2.53,0.95,0,0.32,1.3301,0,0.3887,1.9519,0,0.6131],
// 4 14 3.14 0 2.53 1.9519 0 0.6131 2.4413 0 0.8449 2.919 0 1.091
  [4,14,3.14,0,2.53,1.9519,0,0.6131,2.4413,0,0.8449,2.919,0,1.091],
// 3 14 3.14 0 2.53 2.919 0 1.091 3.3617 0 1.2549
  [3,14,3.14,0,2.53,2.919,0,1.091,3.3617,0,1.2549],
// 3 14 3.14 0 2.53 3.3617 0 1.2549 3.874 0 1.322
  [3,14,3.14,0,2.53,3.3617,0,1.2549,3.874,0,1.322],
// 3 14 3.14 0 2.53 3.874 0 1.322 4.43 0 1.31
  [3,14,3.14,0,2.53,3.874,0,1.322,4.43,0,1.31],
// 4 14 3.14 0 2.53 4.43 0 1.31 4.89 0 1.3 5.15 0 1.37
  [4,14,3.14,0,2.53,4.43,0,1.31,4.89,0,1.3,5.15,0,1.37],
// 4 14 3.14 0 2.53 5.15 0 1.37 5.35 0 1.49 5.57 0 1.66
  [4,14,3.14,0,2.53,5.15,0,1.37,5.35,0,1.49,5.57,0,1.66],
// 4 14 5.43 0 2.54 3.14 0 2.53 5.57 0 1.66 6.0121 0 2.5359
  [4,14,5.43,0,2.54,3.14,0,2.53,5.57,0,1.66,6.0121,0,2.5359],
// 4 14 0.62 0 0.22 -0.62 0 0.24 -0.78 0 -0.06 0.78 0 -0.06
  [4,14,0.62,0,0.22,-0.62,0,0.24,-0.78,0,-0.06,0.78,0,-0.06],
// 4 14 0.78 0 -0.06 -0.78 0 -0.06 -1 0 -0.19 1 0 -0.19
  [4,14,0.78,0,-0.06,-0.78,0,-0.06,-1,0,-0.19,1,0,-0.19],
// 4 14 -1.8451 0 -0.7637 1 0 -0.19 -1 0 -0.19 -1.4 0 -0.28
  [4,14,-1.8451,0,-0.7637,1,0,-0.19,-1,0,-0.19,-1.4,0,-0.28],
// 3 14 -1.4 0 -0.28 -1.863 0 -0.357 -1.8451 0 -0.7637
  [3,14,-1.4,0,-0.28,-1.863,0,-0.357,-1.8451,0,-0.7637],
// 4 14 1.8451 0 -0.7637 1.4 0 -0.28 1 0 -0.19 -1.8451 0 -0.7637
  [4,14,1.8451,0,-0.7637,1.4,0,-0.28,1,0,-0.19,-1.8451,0,-0.7637],
// 3 14 1.4 0 -0.28 1.8451 0 -0.7637 1.863 0 -0.357
  [3,14,1.4,0,-0.28,1.8451,0,-0.7637,1.863,0,-0.357],
// 4 14 1.8451 0 -0.7637 -1.8451 0 -0.7637 -0.12 0 -1.72 0.92 0 -1.91
  [4,14,1.8451,0,-0.7637,-1.8451,0,-0.7637,-0.12,0,-1.72,0.92,0,-1.91],
// 3 14 1.8451 0 -0.7637 0.92 0 -1.91 1.9669 0 -1.1021
  [3,14,1.8451,0,-0.7637,0.92,0,-1.91,1.9669,0,-1.1021],
// 4 14 2.2043 0 -1.3969 1.9669 0 -1.1021 0.92 0 -1.91 2.1 0 -2.42
  [4,14,2.2043,0,-1.3969,1.9669,0,-1.1021,0.92,0,-1.91,2.1,0,-2.42],
// 3 14 2.2043 0 -1.3969 2.1 0 -2.42 2.4617 0 -1.5749
  [3,14,2.2043,0,-1.3969,2.1,0,-2.42,2.4617,0,-1.5749],
// 4 14 2.874 0 -1.723 2.4617 0 -1.5749 2.1 0 -2.42 3.01 0 -2.7
  [4,14,2.874,0,-1.723,2.4617,0,-1.5749,2.1,0,-2.42,3.01,0,-2.7],
// 3 14 3.3663 0 -1.6979 2.874 0 -1.723 3.01 0 -2.7
  [3,14,3.3663,0,-1.6979,2.874,0,-1.723,3.01,0,-2.7],
// 4 14 3.7937 0 -1.4879 3.3663 0 -1.6979 3.01 0 -2.7 4.34 0 -2.83
  [4,14,3.7937,0,-1.4879,3.3663,0,-1.6979,3.01,0,-2.7,4.34,0,-2.83],
// 4 14 3.7937 0 -1.4879 4.34 0 -2.83 5.59 0 -2.57 4.0741 0 -1.1851
  [4,14,3.7937,0,-1.4879,4.34,0,-2.83,5.59,0,-2.57,4.0741,0,-1.1851],
// 4 14 4.0741 0 -1.1851 5.59 0 -2.57 6.29 0 -2.09 6.52 0 -1.18
  [4,14,4.0741,0,-1.1851,5.59,0,-2.57,6.29,0,-2.09,6.52,0,-1.18],
// 4 14 4.2749 0 -0.7527 4.0741 0 -1.1851 6.52 0 -1.18 6.62 0 0.08
  [4,14,4.2749,0,-0.7527,4.0741,0,-1.1851,6.52,0,-1.18,6.62,0,0.08],
// 4 14 4.34 0 -0.25 4.2749 0 -0.7527 6.62 0 0.08 4.51 0 0.54
  [4,14,4.34,0,-0.25,4.2749,0,-0.7527,6.62,0,0.08,4.51,0,0.54],
// 3 14 4.51 0 0.54 4.2139 0 0.2357 4.34 0 -0.25
  [3,14,4.51,0,0.54,4.2139,0,0.2357,4.34,0,-0.25],
// 3 14 4.51 0 0.54 4.0661 0 0.5131 4.2139 0 0.2357
  [3,14,4.51,0,0.54,4.0661,0,0.5131,4.2139,0,0.2357],
// 3 14 4.93 0 0.61 4.51 0 0.54 6.62 0 0.08
  [3,14,4.93,0,0.61,4.51,0,0.54,6.62,0,0.08],
// 3 14 5.26 0 0.78 4.93 0 0.61 6.62 0 0.08
  [3,14,5.26,0,0.78,4.93,0,0.61,6.62,0,0.08],
// 4 14 5.44 0 1.02 5.26 0 0.78 6.62 0 0.08 6.49 0 1.39
  [4,14,5.44,0,1.02,5.26,0,0.78,6.62,0,0.08,6.49,0,1.39],
// 3 14 6.49 0 1.39 5.56 0 1.31 5.44 0 1.02
  [3,14,6.49,0,1.39,5.56,0,1.31,5.44,0,1.02],
// 4 14 5.57 0 1.66 5.56 0 1.31 6.49 0 1.39 6.0121 0 2.5359
  [4,14,5.57,0,1.66,5.56,0,1.31,6.49,0,1.39,6.0121,0,2.5359],
];
module ldraw_lib__98138pn8(step=0, col=false, unit=2/5, alt=false, line=0.2, solid=!$preview)
    makepoly(ldraw_lib__98138pn8(), step=step, col=col, unit=unit, alt=alt, line=line, solid=solid);
ldraw_lib__98138pn8(line=0.2);
